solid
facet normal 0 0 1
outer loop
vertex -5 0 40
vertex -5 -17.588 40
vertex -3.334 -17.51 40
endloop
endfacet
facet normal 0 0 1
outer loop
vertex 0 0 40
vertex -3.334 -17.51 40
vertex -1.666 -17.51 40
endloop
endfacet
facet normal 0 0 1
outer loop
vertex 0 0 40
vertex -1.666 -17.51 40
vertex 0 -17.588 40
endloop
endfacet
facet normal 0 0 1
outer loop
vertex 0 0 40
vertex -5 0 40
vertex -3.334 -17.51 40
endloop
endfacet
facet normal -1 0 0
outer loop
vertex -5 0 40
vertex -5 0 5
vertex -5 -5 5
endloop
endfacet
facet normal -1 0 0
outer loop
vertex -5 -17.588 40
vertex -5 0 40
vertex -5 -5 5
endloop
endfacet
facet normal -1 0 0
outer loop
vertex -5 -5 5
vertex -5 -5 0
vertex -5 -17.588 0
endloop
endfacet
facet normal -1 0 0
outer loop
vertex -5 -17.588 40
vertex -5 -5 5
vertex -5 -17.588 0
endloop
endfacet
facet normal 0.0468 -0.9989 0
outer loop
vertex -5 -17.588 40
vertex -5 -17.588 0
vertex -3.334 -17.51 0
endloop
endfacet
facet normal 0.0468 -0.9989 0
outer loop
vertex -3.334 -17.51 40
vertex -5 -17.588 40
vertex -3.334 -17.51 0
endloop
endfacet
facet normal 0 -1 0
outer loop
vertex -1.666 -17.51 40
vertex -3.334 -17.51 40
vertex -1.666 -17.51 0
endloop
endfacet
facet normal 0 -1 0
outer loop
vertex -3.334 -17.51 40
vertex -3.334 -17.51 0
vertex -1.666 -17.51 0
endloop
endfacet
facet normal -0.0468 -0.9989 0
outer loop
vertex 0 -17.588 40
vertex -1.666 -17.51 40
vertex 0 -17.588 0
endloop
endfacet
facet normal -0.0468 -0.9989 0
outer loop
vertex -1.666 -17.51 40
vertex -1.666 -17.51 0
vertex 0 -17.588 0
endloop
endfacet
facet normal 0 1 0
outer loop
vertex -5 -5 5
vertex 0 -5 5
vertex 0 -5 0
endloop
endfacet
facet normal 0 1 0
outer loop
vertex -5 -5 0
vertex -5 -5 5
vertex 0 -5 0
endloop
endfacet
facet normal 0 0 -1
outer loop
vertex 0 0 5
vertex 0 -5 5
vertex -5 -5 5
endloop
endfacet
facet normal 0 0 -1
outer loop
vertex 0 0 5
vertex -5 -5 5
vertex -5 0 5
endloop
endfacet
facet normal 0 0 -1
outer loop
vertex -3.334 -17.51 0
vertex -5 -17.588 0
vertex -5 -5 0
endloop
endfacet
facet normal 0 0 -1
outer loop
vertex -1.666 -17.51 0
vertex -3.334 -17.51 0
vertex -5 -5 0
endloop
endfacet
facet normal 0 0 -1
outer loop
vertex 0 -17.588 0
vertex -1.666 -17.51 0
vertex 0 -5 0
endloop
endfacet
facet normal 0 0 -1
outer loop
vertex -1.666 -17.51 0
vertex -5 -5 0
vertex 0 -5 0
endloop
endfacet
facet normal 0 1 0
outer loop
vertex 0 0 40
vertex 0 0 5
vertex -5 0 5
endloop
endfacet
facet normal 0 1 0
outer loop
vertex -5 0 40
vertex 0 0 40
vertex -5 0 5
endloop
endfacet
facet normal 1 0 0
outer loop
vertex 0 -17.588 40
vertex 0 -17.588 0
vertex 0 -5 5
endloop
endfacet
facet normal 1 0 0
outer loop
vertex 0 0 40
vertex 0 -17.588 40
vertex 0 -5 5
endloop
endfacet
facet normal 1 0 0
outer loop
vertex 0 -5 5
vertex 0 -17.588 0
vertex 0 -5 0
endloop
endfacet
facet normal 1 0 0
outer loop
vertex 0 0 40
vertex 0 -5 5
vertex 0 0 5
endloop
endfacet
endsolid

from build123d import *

# Parameters (mm, degrees)
BOSS_EXTRUDE1_DEPTH = 40
SKETCH2_W           = 5
SKETCH2_H           = 5
CUT_EXTRUDE1_DEPTH  = 10


# Read off the part's stored shape, not the designer's step: Boss-Extrude1
with BuildPart() as part:
    # Boss-Extrude1 outline → Boss-Extrude1 (new body)
    with BuildSketch(Plane.XY):
        with BuildLine():
            Line((-5, 0), (-5, -17.588137581))
            ThreePointArc((-5, -17.588137581), (-2.5, -17.5), (0, -17.588137581))
            Line((0, -17.588137581), (0, 0))
            Line((0, 0), (-5, 0))
        make_face()
    extrude(amount=BOSS_EXTRUDE1_DEPTH)

    # Sketch2 → Cut-Extrude1 (cut)
    with BuildSketch(Plane(origin=(0, 0, 0), x_dir=(0, 0, -1), z_dir=(1, 0, 0))):
        with Locations((-2.5, -2.5)):
            Rectangle(SKETCH2_W, SKETCH2_H)
        with Locations((-17.5, 17.5)):
            Rectangle(SKETCH2_W, SKETCH2_H)
    extrude(amount=-CUT_EXTRUDE1_DEPTH, mode=Mode.SUBTRACT)


solid = part.part
